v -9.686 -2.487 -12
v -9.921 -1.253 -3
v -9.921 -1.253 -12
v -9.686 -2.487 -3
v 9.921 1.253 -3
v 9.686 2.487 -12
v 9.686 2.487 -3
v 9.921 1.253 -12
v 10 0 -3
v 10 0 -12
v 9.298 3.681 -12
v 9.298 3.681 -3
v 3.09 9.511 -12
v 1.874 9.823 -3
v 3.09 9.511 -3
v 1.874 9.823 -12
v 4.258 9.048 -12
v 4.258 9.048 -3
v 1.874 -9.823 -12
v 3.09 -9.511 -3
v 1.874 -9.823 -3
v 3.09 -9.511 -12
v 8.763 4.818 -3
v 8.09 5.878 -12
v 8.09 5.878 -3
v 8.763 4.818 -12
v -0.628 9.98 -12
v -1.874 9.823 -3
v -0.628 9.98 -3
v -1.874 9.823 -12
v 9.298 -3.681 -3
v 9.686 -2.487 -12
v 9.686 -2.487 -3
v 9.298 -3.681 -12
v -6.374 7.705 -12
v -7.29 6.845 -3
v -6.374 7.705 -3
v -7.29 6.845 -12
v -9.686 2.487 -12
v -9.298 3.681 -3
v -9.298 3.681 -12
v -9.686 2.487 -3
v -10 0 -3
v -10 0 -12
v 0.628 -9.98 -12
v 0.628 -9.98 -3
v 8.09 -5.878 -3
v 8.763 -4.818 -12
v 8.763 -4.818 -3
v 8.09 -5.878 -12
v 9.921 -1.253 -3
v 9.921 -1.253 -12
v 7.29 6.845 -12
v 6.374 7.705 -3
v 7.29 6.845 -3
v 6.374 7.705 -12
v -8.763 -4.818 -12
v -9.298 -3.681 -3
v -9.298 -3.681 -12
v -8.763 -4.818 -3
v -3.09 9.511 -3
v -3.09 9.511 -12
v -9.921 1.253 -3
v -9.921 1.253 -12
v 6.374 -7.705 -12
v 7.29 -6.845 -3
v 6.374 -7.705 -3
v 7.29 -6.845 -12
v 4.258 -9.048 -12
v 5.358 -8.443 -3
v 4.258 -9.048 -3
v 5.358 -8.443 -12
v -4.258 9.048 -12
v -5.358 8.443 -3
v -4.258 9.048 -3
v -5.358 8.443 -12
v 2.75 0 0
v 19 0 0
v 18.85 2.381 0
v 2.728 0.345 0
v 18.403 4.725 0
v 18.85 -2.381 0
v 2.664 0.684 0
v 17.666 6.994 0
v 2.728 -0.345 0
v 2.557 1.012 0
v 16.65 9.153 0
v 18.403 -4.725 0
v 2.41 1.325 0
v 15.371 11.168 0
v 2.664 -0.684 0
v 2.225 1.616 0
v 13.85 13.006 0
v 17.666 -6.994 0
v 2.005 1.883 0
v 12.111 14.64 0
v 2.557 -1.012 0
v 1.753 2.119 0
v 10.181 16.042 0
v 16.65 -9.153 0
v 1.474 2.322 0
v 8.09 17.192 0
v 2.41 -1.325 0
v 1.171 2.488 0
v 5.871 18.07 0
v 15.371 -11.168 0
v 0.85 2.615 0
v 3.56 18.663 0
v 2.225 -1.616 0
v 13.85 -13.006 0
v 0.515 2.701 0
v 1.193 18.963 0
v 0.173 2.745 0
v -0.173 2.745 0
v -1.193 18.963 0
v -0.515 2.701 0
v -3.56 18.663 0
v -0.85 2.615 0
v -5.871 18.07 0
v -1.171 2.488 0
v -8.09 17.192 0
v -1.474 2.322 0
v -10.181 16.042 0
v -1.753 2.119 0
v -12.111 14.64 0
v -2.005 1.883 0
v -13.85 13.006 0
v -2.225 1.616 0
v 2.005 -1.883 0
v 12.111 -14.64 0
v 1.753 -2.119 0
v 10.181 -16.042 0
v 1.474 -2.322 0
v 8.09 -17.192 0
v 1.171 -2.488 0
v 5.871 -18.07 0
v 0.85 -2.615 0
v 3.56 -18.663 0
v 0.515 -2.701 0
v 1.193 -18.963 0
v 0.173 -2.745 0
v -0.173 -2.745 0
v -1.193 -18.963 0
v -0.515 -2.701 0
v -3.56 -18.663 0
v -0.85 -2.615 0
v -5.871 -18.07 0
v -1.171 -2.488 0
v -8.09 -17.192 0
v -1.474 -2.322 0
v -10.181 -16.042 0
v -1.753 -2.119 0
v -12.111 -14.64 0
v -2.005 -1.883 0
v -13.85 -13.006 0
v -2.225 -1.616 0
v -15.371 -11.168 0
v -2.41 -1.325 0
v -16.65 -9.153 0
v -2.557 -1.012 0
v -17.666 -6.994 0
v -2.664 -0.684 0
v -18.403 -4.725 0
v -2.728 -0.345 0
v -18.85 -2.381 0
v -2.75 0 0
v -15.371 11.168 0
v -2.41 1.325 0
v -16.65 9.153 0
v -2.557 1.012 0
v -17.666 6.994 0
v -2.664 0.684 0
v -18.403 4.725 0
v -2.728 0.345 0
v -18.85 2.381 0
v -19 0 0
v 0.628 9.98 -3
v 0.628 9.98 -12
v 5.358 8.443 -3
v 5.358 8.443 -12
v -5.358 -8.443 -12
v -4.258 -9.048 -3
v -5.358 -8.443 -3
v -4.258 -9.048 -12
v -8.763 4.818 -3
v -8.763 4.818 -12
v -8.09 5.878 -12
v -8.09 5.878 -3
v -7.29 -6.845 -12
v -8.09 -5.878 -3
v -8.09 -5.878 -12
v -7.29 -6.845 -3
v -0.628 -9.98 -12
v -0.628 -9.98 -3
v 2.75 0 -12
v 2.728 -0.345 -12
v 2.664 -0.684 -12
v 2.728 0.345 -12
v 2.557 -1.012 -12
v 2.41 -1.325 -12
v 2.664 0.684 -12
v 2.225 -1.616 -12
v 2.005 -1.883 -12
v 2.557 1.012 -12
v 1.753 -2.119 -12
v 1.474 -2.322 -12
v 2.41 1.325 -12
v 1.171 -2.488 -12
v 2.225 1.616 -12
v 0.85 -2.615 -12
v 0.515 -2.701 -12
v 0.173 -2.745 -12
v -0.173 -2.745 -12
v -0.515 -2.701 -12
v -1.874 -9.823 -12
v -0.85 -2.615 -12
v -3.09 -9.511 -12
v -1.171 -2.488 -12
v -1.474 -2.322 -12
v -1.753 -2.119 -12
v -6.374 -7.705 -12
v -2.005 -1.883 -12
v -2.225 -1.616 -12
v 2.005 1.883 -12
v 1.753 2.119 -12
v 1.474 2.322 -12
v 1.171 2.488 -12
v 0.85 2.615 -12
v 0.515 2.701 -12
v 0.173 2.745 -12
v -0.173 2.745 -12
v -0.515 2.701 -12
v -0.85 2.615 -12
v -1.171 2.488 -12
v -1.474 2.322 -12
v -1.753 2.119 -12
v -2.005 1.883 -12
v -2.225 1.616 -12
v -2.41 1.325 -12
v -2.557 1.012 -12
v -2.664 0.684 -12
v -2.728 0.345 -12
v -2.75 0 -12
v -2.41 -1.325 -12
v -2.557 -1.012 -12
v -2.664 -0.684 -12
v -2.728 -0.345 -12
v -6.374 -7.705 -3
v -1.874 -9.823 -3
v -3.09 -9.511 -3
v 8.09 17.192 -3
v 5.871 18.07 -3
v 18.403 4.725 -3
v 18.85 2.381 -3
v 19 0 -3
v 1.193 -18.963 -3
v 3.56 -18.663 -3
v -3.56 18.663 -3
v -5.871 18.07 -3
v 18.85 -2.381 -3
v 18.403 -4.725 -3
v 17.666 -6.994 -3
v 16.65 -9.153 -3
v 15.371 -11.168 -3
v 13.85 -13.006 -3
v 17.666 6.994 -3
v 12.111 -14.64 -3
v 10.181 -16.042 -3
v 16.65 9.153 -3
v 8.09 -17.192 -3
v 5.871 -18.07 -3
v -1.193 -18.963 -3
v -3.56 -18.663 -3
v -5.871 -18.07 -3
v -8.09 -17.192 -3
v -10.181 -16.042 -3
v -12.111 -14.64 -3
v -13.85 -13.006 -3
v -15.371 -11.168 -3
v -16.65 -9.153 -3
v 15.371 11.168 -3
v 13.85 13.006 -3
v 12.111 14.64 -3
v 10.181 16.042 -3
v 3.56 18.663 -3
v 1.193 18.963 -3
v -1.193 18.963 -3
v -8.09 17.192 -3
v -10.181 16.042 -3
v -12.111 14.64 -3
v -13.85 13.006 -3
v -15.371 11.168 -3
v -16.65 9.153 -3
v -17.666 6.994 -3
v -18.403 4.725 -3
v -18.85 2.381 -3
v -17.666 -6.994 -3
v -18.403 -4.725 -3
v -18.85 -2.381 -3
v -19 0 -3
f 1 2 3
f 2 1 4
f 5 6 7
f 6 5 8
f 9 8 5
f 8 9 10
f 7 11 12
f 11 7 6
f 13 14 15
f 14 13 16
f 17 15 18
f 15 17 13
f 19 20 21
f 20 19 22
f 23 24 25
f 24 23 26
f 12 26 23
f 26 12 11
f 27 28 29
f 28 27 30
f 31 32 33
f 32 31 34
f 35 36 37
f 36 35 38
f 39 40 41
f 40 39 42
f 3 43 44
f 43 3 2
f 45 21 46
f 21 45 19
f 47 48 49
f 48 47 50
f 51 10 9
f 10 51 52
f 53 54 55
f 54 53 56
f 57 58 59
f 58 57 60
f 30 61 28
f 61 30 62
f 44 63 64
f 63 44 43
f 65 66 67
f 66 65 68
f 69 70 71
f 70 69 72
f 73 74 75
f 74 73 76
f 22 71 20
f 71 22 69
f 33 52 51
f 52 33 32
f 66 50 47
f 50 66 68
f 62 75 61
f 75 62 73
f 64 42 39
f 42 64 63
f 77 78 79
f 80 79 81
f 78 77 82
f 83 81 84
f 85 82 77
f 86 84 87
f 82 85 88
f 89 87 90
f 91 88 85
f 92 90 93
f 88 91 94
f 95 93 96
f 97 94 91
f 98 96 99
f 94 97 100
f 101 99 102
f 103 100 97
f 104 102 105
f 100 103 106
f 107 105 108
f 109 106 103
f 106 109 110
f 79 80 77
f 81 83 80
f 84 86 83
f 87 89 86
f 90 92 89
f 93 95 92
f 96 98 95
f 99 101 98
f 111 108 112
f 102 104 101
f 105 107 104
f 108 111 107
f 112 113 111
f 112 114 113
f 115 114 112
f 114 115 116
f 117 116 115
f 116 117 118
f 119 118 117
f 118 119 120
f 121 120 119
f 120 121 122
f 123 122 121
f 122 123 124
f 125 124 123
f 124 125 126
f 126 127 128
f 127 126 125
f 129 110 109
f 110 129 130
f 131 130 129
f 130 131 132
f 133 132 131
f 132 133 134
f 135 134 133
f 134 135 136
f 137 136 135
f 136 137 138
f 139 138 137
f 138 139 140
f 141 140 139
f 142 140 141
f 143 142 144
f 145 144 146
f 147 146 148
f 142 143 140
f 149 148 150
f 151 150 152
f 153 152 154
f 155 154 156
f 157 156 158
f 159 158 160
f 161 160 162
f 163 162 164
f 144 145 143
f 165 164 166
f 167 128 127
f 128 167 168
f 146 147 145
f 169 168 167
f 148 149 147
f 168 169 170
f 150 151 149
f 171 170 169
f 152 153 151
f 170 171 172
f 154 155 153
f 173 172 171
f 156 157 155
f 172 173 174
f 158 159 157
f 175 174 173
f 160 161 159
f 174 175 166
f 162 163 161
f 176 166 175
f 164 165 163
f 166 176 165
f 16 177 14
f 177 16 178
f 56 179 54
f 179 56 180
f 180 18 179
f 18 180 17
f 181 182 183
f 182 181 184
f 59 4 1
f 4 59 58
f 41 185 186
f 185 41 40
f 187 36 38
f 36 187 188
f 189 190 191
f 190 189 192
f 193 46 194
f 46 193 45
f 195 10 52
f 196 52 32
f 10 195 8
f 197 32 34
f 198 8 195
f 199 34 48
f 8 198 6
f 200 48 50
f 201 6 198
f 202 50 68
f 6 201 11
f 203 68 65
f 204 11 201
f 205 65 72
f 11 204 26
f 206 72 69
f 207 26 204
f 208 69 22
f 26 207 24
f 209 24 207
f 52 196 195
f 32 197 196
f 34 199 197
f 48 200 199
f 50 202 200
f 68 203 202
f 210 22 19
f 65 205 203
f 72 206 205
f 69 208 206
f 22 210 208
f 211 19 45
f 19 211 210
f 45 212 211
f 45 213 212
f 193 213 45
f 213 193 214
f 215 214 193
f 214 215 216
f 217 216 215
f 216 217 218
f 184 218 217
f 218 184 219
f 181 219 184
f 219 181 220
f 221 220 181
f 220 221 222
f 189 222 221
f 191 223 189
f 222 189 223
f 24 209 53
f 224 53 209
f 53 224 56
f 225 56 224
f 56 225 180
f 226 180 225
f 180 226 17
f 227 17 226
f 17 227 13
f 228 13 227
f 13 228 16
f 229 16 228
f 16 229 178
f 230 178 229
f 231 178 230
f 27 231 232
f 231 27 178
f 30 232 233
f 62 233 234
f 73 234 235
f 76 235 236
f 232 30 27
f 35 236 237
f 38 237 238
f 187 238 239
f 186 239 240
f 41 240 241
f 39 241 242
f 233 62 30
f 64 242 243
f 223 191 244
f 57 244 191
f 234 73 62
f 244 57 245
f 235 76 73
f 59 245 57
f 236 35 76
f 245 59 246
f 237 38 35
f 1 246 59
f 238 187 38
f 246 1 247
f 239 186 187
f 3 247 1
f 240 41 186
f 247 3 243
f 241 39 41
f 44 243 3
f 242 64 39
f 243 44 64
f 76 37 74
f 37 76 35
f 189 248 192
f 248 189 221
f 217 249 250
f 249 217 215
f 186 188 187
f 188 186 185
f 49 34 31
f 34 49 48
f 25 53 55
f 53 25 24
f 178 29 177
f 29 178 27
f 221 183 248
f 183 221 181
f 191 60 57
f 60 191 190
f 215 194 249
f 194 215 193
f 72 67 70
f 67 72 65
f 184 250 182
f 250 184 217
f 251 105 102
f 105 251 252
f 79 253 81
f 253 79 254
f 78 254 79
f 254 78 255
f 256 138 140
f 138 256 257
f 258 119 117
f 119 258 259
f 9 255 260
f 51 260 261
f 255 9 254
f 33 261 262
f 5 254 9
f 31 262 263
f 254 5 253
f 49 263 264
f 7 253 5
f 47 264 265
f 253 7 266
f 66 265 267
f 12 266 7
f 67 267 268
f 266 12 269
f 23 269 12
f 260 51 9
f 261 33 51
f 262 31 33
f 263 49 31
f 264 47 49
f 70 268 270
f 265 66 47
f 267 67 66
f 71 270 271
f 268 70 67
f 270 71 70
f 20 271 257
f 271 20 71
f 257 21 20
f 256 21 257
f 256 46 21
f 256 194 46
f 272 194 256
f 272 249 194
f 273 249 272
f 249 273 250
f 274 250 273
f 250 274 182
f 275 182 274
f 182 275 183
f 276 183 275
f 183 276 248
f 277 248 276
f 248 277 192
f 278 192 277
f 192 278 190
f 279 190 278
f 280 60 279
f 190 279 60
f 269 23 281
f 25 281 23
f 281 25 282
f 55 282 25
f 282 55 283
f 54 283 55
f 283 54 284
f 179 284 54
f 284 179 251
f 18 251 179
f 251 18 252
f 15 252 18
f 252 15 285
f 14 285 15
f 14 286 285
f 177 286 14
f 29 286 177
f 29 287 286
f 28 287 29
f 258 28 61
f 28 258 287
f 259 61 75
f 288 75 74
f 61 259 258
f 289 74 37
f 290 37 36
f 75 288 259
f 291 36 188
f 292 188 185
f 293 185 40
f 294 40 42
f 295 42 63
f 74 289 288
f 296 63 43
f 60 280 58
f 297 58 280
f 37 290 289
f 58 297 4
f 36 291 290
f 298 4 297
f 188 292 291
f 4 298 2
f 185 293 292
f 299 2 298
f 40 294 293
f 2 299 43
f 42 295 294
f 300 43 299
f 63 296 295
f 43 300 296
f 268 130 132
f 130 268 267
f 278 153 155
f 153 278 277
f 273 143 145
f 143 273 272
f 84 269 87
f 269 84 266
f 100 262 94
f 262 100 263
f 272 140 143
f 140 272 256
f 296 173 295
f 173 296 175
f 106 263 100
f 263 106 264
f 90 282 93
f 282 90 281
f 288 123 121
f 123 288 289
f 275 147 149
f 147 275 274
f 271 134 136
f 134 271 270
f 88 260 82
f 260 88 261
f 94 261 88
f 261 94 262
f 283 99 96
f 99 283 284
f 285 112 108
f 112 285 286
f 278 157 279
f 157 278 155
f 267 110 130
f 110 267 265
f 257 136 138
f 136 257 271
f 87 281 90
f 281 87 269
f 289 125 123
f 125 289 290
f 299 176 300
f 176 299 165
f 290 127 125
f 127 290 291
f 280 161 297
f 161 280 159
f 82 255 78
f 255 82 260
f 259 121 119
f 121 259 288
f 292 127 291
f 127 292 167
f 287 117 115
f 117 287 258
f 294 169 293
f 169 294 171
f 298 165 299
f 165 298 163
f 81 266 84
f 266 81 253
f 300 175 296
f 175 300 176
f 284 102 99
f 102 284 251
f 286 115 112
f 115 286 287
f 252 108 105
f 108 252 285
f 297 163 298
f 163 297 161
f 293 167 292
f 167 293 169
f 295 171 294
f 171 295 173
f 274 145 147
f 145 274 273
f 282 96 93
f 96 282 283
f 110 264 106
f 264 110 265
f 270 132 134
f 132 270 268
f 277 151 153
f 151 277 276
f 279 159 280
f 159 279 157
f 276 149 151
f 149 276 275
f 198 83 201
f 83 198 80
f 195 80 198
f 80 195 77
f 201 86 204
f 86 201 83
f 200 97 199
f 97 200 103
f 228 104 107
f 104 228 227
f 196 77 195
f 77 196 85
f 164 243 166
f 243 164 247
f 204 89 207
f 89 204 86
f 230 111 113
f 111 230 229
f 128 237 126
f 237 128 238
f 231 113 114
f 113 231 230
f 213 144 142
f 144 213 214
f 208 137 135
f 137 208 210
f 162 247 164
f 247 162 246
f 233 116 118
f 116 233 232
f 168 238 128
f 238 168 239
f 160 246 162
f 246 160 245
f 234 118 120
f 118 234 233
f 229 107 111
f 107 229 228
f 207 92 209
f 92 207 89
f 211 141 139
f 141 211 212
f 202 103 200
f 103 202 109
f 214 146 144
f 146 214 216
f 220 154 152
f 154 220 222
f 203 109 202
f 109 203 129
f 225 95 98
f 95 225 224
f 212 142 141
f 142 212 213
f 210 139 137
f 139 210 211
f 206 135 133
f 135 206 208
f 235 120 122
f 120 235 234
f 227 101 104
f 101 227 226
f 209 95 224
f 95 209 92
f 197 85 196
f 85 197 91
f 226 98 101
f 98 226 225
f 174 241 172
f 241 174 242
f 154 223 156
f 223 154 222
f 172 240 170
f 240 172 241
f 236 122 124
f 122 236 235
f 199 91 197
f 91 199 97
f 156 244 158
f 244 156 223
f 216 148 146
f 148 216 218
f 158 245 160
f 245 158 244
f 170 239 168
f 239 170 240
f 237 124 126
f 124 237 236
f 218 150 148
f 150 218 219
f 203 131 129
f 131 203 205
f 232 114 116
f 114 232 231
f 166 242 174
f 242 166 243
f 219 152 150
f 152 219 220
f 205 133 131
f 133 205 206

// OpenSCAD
$fn = 50;


difference() {
	union() {
		translate(v = [0, 0, -12.0000000000]) {
			cylinder(h = 12, r = 10.0000000000);
		}
		translate(v = [0, 0, -3.0000000000]) {
			cylinder(h = 3, r = 19.0000000000);
		}
	}
	union() {
		#translate(v = [0, 0, -12]) {
			cylinder(h = 12, r = 2.7500000000);
		}
	}
}
